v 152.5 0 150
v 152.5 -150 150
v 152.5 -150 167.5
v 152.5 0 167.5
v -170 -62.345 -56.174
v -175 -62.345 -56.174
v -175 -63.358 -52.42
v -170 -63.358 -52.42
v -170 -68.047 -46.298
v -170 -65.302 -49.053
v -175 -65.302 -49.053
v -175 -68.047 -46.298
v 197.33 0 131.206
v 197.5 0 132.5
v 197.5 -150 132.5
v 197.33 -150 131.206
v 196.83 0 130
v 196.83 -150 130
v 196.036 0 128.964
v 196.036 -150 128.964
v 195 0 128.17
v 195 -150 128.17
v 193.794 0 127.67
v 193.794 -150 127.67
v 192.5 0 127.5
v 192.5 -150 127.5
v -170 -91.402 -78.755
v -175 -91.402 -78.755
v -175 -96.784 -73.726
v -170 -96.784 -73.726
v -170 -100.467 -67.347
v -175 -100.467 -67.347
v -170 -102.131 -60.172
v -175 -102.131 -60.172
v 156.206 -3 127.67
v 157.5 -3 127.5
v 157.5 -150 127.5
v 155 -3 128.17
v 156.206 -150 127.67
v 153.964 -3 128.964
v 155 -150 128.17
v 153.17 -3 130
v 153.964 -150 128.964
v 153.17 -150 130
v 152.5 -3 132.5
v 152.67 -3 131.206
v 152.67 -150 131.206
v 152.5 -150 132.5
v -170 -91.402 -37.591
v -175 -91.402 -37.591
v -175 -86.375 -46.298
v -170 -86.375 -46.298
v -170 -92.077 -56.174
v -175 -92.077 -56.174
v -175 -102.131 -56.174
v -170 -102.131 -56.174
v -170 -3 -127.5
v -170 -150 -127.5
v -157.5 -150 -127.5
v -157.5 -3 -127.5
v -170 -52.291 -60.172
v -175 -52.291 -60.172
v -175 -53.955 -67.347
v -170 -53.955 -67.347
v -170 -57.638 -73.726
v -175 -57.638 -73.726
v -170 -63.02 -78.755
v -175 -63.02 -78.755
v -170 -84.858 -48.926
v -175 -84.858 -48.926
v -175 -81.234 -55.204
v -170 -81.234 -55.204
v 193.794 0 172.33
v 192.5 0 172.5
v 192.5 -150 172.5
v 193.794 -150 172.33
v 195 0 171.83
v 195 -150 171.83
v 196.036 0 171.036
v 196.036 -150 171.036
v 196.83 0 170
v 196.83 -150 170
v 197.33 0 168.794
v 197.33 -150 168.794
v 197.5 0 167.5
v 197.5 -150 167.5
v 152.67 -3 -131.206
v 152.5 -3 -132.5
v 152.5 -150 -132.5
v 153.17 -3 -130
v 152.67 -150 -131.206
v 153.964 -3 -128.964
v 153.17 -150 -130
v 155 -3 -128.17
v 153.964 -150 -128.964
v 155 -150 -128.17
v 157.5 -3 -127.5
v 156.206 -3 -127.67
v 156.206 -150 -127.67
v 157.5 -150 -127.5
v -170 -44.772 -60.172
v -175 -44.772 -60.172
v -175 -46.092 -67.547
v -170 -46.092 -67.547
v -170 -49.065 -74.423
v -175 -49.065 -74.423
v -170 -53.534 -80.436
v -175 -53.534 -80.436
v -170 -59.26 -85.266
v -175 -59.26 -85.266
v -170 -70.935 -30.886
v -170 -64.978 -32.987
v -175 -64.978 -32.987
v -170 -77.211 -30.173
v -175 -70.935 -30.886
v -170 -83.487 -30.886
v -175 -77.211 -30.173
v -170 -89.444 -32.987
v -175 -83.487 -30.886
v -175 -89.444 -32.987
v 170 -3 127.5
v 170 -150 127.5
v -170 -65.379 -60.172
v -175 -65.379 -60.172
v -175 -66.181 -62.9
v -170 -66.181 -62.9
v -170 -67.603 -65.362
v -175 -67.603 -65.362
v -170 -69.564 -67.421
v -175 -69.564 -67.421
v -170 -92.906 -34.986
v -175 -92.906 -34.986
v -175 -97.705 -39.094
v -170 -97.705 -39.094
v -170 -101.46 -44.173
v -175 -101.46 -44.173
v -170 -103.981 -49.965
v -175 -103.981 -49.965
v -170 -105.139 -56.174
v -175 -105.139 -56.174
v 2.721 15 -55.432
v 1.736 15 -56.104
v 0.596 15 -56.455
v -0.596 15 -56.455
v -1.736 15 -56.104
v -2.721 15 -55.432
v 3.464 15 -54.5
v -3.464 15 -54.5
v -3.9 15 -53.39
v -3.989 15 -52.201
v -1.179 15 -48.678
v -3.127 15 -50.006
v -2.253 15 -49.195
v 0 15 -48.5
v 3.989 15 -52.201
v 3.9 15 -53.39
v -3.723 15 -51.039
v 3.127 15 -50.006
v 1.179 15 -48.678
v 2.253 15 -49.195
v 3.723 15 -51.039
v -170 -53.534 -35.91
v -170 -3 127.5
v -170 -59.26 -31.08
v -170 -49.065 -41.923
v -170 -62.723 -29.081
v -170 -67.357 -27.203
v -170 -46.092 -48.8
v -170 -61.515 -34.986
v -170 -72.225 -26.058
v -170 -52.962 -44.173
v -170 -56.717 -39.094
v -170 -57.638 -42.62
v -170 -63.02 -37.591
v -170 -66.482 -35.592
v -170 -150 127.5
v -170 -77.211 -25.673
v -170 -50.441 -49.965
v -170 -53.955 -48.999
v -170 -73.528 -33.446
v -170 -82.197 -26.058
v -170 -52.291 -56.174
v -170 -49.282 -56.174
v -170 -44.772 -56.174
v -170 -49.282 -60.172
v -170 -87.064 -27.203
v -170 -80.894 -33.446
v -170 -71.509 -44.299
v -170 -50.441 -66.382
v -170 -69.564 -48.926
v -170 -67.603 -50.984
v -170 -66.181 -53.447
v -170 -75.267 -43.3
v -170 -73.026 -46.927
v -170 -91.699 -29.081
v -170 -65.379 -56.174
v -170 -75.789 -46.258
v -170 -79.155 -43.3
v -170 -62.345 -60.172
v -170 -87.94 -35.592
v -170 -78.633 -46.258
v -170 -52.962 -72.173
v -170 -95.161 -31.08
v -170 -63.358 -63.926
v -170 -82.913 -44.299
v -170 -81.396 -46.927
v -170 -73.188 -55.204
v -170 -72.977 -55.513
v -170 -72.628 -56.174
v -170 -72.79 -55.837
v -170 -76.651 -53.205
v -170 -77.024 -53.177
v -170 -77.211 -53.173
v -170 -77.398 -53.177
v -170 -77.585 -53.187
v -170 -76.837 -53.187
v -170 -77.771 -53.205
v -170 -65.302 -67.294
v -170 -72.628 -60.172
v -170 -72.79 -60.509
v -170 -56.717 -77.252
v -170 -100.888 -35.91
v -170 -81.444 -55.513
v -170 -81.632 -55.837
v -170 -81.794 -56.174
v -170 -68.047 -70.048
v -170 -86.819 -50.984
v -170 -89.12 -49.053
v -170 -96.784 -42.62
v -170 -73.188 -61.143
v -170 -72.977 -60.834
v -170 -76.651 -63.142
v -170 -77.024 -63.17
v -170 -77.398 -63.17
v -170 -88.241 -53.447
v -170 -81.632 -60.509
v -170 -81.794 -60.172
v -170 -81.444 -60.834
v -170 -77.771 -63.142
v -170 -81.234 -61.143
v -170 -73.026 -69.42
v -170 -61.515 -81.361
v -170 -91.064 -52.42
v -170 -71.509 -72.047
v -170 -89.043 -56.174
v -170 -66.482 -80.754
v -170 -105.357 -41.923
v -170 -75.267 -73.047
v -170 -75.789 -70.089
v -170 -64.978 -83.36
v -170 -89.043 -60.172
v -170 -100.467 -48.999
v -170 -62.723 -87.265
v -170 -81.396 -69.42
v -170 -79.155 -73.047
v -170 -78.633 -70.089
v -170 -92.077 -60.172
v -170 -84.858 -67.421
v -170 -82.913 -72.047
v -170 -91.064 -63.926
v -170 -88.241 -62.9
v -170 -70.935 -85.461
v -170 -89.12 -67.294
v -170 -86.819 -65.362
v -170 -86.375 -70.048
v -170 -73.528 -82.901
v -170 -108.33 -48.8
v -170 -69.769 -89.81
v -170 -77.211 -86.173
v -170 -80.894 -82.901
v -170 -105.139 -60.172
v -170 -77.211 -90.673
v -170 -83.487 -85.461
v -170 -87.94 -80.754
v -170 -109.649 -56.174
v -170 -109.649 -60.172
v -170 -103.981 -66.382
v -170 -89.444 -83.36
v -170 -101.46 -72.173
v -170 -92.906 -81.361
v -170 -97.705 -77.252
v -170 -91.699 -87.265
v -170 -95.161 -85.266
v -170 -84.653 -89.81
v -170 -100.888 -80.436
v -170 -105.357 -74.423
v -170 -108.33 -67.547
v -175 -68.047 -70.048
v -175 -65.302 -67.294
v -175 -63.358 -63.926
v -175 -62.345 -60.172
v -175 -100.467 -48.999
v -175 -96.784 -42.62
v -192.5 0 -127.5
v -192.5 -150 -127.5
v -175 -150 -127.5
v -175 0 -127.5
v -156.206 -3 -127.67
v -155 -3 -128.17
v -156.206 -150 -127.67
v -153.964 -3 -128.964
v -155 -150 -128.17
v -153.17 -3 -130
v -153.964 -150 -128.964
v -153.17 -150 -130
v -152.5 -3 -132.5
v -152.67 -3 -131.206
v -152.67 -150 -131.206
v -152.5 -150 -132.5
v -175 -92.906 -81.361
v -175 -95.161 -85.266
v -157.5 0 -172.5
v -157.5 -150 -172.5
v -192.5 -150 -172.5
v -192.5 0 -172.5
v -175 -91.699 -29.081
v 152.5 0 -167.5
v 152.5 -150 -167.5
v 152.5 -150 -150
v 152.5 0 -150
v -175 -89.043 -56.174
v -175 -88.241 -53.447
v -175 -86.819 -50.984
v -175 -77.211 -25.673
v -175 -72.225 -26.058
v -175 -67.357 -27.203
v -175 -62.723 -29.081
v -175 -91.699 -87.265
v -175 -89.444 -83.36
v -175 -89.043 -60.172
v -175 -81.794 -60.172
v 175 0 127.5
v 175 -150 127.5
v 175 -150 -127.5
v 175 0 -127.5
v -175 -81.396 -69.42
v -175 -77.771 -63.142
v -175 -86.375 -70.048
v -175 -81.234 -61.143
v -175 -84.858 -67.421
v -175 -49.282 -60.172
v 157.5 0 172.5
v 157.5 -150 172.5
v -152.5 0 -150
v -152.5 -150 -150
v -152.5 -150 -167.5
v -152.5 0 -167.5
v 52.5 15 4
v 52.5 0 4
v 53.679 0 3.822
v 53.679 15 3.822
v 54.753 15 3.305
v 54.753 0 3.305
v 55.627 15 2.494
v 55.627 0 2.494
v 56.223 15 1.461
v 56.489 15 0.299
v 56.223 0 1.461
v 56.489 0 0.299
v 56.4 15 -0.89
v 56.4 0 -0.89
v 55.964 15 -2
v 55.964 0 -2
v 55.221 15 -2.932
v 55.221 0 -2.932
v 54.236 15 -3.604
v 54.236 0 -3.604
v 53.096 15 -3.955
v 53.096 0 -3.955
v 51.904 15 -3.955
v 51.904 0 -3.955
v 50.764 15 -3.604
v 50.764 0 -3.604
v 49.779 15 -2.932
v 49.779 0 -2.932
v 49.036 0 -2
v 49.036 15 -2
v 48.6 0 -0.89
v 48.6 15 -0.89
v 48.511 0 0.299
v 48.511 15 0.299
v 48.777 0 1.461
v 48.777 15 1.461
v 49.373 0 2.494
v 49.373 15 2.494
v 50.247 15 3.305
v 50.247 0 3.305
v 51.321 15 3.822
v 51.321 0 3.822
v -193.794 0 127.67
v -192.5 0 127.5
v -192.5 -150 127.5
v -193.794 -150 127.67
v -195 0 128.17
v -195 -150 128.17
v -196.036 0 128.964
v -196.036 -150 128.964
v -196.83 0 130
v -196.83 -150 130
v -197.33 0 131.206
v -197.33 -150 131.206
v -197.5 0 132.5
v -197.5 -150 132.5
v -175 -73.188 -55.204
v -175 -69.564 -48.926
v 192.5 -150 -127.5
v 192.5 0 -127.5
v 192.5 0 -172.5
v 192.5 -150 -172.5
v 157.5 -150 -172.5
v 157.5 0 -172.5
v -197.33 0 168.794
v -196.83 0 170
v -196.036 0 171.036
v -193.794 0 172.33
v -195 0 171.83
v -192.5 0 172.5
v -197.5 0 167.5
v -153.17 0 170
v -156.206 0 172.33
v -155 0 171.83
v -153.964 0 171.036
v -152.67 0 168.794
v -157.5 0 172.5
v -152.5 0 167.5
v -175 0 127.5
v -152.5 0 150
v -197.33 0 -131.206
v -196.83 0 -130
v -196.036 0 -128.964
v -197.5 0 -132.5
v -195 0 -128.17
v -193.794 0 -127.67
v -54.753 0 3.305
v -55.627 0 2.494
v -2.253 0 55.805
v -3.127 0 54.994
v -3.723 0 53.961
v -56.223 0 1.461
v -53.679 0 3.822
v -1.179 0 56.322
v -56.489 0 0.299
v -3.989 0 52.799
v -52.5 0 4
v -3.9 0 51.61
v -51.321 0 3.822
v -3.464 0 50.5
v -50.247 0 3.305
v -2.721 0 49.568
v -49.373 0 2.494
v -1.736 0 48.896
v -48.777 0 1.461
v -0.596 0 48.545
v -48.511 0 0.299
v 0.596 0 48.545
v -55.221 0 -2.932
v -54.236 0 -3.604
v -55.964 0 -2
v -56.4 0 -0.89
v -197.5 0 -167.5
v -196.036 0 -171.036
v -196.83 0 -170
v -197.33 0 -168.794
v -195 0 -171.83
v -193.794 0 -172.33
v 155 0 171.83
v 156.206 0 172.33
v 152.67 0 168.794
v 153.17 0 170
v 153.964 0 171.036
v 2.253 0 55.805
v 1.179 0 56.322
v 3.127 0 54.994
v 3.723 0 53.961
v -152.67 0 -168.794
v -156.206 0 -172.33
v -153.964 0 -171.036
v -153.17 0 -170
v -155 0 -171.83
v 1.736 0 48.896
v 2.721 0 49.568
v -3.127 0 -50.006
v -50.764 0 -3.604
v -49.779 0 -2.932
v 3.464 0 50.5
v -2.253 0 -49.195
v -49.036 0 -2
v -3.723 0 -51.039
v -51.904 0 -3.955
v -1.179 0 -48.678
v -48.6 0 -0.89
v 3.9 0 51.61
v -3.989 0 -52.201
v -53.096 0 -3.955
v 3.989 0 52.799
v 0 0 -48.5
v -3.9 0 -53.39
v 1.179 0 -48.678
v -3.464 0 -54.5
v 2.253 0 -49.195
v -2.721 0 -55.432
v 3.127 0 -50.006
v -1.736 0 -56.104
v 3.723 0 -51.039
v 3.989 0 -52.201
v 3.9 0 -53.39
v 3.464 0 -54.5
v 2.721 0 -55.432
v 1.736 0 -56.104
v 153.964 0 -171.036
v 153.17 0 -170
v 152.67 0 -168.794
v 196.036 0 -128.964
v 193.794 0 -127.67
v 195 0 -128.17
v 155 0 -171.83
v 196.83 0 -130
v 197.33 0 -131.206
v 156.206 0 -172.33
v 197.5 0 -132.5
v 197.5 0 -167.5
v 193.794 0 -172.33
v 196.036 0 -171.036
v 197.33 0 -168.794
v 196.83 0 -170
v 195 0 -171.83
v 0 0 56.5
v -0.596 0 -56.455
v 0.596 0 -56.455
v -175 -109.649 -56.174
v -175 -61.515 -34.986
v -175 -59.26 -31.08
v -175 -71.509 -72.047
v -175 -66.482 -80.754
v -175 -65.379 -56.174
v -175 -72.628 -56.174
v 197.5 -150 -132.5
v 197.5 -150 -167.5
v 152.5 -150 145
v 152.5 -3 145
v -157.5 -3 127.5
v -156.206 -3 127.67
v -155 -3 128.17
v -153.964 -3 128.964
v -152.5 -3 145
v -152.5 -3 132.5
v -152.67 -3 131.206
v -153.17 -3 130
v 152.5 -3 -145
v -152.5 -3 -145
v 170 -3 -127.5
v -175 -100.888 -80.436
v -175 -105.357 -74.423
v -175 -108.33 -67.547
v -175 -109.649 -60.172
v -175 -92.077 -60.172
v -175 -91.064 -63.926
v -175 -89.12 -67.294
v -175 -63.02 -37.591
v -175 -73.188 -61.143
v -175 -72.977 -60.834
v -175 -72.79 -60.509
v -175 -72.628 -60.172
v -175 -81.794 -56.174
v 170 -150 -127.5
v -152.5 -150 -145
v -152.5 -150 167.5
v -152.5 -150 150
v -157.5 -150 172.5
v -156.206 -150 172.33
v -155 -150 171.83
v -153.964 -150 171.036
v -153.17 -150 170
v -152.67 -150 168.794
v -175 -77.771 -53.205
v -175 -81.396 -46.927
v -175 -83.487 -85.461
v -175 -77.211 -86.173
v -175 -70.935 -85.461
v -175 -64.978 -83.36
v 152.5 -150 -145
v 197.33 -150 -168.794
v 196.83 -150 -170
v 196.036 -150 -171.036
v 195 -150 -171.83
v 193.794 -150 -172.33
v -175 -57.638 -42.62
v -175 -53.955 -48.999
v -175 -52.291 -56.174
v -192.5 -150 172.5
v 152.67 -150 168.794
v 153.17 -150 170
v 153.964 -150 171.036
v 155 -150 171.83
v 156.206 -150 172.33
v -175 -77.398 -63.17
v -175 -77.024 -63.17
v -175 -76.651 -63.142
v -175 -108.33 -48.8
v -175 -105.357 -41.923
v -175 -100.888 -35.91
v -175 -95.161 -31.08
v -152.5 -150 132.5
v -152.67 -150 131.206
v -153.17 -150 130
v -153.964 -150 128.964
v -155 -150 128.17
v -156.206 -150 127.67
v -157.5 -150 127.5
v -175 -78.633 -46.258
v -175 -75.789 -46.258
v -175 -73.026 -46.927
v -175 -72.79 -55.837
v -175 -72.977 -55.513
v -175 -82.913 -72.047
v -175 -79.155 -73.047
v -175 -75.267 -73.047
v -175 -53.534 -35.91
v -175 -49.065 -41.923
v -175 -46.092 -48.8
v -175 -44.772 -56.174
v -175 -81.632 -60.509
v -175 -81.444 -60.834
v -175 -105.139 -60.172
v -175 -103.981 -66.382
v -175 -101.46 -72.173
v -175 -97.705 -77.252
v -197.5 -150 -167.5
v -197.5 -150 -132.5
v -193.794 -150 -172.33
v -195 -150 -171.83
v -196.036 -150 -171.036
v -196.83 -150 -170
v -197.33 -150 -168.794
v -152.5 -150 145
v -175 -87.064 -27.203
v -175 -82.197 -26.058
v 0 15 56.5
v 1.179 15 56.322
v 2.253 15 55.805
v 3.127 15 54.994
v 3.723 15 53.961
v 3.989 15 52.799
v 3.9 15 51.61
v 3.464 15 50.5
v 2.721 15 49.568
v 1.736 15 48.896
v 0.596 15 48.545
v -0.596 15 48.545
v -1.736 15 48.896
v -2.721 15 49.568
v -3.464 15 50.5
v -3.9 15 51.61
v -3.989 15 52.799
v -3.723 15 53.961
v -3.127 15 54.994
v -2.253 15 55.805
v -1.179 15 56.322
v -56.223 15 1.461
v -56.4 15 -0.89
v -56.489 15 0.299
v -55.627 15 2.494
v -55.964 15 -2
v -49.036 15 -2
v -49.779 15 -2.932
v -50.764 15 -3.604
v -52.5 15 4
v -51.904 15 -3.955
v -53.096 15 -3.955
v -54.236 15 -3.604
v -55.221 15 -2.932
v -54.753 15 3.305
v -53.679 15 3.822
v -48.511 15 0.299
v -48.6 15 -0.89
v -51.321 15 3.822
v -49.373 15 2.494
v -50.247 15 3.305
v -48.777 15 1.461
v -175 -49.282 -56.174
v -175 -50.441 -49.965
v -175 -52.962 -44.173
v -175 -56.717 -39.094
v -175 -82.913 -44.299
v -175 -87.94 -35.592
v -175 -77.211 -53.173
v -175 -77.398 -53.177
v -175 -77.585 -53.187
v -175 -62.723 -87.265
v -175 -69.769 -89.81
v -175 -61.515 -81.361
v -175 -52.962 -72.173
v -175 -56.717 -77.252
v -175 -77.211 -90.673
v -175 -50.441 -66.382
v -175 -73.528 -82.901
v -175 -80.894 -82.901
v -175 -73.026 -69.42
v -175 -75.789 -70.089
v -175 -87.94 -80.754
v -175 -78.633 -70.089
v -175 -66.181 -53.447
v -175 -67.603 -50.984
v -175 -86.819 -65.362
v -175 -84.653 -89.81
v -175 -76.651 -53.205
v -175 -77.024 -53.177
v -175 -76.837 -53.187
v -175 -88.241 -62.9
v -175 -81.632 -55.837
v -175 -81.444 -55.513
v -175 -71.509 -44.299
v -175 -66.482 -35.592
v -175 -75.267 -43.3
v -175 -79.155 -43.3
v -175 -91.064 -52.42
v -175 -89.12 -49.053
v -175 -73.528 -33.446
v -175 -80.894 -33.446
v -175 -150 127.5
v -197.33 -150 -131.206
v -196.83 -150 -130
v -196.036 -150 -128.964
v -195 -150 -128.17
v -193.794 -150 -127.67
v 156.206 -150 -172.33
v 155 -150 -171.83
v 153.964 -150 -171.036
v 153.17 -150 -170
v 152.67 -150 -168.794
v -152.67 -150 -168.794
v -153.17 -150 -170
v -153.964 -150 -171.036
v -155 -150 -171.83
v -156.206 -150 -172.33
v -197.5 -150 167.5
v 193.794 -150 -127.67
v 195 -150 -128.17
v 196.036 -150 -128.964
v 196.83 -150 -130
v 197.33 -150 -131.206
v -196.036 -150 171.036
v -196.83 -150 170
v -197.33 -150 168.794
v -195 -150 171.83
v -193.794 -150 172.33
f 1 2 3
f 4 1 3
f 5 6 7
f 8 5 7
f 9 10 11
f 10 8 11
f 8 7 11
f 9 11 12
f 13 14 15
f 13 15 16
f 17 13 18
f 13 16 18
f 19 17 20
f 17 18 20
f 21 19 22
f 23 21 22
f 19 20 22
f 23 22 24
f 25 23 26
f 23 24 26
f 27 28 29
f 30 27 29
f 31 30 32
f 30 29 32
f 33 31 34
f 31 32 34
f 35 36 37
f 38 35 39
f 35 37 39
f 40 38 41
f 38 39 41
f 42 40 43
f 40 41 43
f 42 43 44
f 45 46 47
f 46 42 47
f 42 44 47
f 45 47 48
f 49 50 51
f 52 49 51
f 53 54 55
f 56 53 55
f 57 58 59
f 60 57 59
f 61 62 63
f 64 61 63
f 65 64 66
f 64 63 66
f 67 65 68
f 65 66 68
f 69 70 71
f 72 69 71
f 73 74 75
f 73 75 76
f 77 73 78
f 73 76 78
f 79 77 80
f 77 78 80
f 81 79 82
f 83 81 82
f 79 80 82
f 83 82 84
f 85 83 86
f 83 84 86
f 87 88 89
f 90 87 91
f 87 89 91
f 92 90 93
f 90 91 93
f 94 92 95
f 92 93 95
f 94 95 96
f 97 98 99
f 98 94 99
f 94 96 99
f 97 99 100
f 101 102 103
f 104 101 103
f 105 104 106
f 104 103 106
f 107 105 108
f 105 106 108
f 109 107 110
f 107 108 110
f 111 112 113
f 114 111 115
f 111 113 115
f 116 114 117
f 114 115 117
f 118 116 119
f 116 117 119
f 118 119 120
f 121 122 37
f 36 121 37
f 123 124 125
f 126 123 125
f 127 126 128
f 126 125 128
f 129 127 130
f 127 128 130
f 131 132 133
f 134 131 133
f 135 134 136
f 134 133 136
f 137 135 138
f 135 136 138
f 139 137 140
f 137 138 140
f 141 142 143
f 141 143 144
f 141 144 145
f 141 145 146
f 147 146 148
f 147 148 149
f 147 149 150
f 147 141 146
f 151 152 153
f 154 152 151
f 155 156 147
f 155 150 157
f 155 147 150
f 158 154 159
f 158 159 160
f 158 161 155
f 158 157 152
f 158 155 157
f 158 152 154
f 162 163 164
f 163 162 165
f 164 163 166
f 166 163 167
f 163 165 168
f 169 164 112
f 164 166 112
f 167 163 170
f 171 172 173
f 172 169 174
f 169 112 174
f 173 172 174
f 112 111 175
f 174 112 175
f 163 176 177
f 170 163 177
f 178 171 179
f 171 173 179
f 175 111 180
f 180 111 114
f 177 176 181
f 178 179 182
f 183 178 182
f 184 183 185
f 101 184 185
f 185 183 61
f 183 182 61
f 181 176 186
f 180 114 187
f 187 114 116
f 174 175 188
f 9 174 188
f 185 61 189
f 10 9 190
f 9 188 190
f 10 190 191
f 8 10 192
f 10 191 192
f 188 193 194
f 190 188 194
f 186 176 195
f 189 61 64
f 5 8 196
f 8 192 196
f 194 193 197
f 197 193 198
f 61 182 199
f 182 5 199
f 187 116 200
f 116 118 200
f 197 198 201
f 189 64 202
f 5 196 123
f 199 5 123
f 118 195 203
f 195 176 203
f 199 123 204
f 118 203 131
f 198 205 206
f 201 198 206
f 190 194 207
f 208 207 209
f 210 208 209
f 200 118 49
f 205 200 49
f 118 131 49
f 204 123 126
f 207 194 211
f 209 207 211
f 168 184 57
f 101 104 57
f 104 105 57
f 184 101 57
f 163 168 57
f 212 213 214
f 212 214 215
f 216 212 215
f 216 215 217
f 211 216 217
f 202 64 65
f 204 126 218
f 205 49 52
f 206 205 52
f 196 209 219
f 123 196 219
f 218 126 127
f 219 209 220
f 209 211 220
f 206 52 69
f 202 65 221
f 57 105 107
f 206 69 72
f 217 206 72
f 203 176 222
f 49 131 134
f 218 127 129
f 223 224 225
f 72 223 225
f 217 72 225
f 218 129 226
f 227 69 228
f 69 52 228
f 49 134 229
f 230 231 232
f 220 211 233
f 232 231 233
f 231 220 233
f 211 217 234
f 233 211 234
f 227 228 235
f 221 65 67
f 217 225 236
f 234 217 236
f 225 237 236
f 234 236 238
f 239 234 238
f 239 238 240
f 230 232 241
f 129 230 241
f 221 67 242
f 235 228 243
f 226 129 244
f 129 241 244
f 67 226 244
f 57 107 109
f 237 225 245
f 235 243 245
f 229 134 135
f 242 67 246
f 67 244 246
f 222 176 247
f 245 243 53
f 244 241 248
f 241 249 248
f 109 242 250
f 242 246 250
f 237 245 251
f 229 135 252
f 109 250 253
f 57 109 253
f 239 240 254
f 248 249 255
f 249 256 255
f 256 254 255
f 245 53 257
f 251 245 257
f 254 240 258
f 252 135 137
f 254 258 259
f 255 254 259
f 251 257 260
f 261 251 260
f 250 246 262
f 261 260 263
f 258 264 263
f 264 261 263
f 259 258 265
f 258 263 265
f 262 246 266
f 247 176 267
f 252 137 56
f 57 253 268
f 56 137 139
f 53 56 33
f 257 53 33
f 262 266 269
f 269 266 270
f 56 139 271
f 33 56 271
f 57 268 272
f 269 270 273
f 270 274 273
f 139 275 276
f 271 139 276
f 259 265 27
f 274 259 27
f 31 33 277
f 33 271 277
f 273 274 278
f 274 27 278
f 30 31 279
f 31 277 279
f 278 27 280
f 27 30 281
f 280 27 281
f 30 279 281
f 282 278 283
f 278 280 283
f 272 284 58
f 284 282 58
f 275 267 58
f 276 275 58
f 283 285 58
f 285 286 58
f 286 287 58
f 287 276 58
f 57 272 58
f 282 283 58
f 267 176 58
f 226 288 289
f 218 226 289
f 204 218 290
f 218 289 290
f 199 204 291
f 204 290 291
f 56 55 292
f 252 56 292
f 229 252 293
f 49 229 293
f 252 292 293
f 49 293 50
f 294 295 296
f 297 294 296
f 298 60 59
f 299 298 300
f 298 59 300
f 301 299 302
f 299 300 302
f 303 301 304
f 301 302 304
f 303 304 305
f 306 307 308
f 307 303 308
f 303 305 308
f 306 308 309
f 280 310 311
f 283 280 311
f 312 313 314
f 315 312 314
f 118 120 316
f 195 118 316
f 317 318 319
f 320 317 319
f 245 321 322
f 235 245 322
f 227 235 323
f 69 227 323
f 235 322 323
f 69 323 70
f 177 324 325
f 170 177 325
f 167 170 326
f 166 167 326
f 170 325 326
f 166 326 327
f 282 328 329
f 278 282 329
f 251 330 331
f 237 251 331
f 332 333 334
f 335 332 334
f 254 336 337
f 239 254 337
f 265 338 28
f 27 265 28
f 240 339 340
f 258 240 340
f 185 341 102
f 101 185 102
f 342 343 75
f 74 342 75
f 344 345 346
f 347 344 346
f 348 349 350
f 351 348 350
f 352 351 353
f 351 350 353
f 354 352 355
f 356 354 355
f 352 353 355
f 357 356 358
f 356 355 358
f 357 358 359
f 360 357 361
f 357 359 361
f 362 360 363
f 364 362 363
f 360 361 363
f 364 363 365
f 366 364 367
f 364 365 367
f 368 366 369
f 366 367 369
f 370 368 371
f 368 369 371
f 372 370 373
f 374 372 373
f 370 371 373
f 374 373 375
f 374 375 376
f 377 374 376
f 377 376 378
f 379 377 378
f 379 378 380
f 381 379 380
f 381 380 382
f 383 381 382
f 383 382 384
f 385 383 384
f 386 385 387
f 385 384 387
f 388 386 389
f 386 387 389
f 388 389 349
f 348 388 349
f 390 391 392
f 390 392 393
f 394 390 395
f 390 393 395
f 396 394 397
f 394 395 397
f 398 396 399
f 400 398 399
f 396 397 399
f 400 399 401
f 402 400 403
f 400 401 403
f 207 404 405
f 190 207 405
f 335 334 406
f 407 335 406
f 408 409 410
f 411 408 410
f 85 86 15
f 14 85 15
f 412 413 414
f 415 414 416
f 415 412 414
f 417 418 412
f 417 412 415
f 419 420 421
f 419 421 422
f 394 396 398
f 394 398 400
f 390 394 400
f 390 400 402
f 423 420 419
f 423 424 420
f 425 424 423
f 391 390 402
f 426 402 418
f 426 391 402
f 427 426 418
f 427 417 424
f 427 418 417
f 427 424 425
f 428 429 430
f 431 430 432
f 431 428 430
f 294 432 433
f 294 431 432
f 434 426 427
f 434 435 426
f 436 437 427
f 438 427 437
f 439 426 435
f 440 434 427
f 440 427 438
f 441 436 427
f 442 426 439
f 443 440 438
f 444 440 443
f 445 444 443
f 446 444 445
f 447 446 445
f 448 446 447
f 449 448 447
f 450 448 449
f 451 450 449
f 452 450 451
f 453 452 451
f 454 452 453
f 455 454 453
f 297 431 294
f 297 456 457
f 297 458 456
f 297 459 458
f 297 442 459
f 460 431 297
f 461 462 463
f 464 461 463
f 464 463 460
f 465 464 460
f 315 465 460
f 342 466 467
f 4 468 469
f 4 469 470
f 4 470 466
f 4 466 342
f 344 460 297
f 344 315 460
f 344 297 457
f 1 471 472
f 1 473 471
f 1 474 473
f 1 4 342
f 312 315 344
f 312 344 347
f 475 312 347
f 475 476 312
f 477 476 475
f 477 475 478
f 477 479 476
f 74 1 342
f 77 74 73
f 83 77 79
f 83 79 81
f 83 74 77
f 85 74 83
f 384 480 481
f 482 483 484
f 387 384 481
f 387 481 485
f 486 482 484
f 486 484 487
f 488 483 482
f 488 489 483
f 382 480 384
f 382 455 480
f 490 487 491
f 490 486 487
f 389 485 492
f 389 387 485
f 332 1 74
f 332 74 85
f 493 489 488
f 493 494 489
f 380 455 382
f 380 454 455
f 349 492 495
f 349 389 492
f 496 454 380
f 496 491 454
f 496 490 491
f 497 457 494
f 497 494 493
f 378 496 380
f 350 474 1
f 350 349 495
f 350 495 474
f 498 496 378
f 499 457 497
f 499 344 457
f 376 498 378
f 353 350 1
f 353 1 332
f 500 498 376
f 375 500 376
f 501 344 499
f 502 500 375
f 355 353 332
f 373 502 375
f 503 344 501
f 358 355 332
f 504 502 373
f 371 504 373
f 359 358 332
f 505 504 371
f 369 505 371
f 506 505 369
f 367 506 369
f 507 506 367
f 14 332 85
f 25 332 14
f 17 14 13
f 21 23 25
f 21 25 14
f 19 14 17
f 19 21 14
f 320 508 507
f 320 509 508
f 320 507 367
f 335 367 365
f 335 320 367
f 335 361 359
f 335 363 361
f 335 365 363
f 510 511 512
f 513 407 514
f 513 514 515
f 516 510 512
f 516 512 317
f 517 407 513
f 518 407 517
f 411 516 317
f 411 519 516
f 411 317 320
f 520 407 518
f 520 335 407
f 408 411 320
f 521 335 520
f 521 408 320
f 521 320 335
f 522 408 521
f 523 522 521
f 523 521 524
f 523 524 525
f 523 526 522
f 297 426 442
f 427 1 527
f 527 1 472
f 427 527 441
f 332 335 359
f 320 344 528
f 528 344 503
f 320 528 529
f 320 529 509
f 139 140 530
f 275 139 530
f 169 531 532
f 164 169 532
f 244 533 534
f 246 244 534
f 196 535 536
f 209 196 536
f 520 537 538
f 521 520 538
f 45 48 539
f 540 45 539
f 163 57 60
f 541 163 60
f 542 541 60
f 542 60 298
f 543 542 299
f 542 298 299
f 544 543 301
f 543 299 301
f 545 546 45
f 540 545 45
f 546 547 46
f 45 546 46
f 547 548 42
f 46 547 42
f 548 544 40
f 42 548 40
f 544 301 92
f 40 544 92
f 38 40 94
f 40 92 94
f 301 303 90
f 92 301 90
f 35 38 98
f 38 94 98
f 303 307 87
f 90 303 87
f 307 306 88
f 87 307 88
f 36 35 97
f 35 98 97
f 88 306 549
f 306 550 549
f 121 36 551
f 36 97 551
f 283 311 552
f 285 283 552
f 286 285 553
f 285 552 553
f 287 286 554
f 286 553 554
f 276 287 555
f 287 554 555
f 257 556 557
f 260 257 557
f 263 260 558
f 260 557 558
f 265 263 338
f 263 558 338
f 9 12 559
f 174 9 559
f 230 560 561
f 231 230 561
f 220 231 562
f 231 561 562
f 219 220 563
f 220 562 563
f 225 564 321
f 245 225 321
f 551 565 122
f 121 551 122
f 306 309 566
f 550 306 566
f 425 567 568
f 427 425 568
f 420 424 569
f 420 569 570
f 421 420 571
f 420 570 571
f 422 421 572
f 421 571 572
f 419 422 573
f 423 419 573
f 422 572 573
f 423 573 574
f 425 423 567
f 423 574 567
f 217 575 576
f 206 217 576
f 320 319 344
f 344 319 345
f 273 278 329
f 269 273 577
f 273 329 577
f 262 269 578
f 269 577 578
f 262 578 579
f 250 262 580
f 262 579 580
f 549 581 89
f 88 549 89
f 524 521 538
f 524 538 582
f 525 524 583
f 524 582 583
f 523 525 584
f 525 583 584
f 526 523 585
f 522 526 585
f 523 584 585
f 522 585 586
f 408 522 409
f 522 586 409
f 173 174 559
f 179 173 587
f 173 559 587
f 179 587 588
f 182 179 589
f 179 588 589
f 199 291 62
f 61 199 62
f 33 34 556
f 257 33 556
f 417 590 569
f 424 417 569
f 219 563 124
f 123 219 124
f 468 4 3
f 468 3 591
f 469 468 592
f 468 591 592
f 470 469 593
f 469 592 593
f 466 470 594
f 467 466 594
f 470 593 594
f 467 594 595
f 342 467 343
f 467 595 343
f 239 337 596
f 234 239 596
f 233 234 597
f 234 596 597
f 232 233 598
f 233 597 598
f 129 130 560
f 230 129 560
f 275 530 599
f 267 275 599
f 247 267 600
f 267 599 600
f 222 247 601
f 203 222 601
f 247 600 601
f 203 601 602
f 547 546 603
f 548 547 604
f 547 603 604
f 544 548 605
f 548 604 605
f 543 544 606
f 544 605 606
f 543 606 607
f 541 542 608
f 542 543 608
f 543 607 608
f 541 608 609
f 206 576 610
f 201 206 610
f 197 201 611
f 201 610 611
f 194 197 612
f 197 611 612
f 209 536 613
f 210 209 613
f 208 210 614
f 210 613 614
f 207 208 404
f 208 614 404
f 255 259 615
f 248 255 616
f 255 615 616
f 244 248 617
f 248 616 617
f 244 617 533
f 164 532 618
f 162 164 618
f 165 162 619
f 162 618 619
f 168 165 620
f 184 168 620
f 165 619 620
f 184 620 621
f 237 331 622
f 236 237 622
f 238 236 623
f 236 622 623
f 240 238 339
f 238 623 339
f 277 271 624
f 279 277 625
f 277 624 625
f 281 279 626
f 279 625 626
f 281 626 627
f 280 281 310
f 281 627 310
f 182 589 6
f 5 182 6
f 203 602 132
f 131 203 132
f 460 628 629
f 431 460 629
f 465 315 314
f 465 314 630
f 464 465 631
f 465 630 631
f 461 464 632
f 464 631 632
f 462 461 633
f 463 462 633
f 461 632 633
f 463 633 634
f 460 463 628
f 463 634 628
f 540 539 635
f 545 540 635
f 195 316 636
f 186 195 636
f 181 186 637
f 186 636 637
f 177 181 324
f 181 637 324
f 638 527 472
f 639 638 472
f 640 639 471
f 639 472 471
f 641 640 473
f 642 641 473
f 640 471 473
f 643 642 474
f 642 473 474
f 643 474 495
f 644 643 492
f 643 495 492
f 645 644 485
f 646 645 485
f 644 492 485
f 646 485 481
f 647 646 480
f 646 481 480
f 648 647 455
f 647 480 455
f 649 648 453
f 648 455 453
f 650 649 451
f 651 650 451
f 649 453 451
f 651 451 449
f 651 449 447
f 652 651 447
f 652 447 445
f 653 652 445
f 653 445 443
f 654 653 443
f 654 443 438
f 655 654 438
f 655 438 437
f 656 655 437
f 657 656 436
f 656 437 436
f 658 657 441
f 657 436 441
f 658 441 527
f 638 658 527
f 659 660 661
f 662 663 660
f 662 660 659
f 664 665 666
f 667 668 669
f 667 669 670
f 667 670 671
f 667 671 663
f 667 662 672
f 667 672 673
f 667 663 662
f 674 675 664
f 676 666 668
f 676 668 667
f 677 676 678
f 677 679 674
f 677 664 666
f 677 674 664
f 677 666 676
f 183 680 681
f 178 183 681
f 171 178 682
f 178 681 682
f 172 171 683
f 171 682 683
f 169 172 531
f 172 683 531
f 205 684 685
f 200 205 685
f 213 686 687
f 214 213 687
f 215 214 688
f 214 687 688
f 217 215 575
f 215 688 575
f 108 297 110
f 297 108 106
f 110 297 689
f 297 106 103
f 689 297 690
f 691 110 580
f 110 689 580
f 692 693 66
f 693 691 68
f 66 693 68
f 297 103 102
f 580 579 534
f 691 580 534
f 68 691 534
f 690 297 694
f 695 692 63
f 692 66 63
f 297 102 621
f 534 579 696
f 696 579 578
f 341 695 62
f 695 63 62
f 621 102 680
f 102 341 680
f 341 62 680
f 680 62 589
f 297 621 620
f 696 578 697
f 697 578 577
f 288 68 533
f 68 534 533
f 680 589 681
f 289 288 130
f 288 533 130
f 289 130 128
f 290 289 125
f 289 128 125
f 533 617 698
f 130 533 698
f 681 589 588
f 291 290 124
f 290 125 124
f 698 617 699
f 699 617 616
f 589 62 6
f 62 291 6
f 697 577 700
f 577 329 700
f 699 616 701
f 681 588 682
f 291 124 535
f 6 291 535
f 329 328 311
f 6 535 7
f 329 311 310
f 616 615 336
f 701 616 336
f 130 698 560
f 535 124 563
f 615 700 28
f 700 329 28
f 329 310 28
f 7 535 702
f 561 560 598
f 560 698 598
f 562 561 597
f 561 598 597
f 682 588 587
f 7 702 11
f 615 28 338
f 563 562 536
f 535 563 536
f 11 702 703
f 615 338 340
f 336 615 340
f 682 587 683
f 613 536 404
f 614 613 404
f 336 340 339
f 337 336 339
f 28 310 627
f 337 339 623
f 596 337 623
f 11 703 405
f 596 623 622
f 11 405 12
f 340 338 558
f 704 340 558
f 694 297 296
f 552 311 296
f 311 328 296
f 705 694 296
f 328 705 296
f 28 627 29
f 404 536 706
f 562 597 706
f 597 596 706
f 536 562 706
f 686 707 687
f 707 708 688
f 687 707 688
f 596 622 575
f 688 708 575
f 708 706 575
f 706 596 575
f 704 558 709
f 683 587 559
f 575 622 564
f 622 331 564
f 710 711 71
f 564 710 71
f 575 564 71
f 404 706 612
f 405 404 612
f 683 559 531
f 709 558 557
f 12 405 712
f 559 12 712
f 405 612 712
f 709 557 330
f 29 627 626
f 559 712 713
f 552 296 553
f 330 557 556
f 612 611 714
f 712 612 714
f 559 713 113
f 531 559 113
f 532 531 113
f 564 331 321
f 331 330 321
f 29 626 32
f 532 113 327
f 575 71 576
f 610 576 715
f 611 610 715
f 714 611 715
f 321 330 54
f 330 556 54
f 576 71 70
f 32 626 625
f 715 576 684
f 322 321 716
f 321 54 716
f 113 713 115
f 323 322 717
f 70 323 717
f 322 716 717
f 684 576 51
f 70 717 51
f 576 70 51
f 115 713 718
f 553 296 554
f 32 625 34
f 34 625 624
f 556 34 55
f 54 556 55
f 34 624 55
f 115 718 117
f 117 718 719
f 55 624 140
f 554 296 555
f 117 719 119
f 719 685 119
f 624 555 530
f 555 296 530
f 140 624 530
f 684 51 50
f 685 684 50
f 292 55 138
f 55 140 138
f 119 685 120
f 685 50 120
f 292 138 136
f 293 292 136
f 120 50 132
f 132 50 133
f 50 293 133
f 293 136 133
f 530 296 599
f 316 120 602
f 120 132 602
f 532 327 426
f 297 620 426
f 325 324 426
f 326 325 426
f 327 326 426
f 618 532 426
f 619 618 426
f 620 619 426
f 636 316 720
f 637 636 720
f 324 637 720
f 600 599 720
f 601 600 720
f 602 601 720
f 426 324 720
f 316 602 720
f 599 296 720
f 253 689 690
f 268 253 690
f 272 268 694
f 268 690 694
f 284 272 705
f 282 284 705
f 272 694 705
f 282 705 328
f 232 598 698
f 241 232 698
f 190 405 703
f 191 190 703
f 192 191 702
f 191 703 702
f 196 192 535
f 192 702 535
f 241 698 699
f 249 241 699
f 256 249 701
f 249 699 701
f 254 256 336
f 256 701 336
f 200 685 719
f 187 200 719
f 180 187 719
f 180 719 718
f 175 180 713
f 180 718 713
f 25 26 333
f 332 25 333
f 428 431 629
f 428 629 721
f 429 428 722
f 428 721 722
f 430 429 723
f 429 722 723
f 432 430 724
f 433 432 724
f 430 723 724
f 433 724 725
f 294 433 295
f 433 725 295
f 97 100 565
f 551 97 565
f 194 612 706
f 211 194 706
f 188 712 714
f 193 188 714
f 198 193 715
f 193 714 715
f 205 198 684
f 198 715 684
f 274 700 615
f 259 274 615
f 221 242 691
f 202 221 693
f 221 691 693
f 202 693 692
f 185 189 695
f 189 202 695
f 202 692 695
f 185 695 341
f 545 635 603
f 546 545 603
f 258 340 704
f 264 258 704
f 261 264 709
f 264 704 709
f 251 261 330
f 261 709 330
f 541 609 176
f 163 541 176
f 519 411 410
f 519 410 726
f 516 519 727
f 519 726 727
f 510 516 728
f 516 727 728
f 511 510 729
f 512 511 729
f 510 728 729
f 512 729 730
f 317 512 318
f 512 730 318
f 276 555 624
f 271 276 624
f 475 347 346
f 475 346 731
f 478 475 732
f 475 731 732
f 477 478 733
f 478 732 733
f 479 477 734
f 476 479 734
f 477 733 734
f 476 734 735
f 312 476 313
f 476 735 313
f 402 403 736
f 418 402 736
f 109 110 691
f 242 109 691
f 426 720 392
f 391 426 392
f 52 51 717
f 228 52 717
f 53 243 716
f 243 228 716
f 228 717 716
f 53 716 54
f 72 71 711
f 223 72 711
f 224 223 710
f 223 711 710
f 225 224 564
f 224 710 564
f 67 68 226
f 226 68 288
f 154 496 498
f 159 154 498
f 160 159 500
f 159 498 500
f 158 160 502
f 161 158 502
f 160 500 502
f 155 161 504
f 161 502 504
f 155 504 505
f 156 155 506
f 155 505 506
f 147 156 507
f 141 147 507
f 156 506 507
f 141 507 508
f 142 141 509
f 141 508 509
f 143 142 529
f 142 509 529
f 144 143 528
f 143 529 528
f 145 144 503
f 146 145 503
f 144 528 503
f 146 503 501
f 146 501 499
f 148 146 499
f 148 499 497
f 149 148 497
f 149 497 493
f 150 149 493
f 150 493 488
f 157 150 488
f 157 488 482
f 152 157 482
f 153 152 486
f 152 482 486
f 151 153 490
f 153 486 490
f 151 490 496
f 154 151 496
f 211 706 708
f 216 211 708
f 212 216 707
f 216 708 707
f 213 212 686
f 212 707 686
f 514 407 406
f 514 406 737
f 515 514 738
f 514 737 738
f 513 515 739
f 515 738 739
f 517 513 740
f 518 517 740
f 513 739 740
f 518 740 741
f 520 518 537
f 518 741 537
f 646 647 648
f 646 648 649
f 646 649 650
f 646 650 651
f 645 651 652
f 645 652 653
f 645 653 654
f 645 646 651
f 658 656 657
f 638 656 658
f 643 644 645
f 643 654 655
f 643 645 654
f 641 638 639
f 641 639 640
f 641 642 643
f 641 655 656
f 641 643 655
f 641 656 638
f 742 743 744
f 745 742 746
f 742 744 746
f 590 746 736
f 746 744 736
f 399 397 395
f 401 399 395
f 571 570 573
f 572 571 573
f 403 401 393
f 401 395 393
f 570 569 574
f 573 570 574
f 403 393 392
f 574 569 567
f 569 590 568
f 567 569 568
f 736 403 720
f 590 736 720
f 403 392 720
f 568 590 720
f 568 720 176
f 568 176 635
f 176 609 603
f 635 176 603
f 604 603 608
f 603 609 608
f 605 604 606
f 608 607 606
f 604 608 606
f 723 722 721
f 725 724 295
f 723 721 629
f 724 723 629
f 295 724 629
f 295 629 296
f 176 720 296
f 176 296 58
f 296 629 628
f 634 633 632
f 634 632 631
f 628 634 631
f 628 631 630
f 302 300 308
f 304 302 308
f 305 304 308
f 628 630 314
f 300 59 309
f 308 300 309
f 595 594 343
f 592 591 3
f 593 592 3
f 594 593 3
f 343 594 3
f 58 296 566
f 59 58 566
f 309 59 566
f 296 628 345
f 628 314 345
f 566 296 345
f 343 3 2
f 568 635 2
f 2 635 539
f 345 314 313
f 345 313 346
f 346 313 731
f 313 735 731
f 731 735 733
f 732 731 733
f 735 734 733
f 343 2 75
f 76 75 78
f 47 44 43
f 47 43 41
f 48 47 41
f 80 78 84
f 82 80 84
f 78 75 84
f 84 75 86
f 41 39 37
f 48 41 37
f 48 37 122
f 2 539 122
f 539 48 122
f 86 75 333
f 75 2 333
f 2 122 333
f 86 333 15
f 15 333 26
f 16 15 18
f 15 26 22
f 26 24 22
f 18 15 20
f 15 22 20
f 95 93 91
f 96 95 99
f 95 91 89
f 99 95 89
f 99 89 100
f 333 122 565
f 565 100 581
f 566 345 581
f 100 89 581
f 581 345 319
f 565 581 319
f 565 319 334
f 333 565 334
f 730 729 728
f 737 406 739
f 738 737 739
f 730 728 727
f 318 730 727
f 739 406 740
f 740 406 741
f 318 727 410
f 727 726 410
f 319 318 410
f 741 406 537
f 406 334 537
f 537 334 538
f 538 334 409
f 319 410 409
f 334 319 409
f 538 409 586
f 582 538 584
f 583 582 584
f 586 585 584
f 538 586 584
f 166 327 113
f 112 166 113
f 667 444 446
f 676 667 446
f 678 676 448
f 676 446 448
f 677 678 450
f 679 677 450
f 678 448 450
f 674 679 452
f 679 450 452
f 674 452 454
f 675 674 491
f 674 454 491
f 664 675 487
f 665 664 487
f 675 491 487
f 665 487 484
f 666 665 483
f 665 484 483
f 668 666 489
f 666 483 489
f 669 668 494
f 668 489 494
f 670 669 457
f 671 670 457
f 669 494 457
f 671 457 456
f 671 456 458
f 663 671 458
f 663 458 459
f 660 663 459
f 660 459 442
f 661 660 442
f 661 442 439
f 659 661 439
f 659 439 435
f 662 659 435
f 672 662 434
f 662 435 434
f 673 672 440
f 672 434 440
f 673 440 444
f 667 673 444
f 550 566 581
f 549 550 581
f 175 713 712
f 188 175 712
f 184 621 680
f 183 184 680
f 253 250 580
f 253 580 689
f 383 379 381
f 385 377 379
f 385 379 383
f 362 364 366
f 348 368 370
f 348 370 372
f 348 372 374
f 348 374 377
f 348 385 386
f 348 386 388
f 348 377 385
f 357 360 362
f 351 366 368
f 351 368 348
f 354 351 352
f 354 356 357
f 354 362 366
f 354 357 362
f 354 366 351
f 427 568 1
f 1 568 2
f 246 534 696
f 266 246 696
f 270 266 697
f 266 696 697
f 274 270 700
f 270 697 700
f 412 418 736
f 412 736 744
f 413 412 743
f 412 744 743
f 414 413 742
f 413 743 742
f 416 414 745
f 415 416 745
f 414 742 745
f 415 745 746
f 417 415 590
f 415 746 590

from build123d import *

# Parameters (mm, degrees)
SKETCH1_W           = 350
SKETCH1_H           = 300
BOSS_EXTRUDE1_DEPTH = 3
SKETCH1_3_R         = 4
BOSS_EXTRUDE2_DEPTH = 15
BOSS_EXTRUDE3_DEPTH = 150
CUT_EXTRUDE1_DEPTH  = 150


with BuildPart() as part:
    # Sketch1 → Boss-Extrude1 (new body)
    with BuildSketch(Plane(origin=(0, 0, 0), x_dir=(1, 0, 0), z_dir=(0, 1, 0))):
        Rectangle(SKETCH1_W, SKETCH1_H)
    extrude(amount=-BOSS_EXTRUDE1_DEPTH)

    # Sketch1<3> → Boss-Extrude2 (add)
    with BuildSketch(Plane(origin=(0, 0, 0), x_dir=(1, 0, 0), z_dir=(0, 1, 0))):
        with Locations((0, 52.5)):
            Circle(SKETCH1_3_R)
        with Locations((0, -52.5)):
            Circle(SKETCH1_3_R)
        with Locations((52.5, 0)):
            Circle(SKETCH1_3_R)
        with Locations((-52.5, 0)):
            Circle(SKETCH1_3_R)
    extrude(amount=BOSS_EXTRUDE2_DEPTH)

    # Sketch1<4> → Boss-Extrude3 (add)
    with BuildSketch(Plane(origin=(0, 0, 0), x_dir=(1, 0, 0), z_dir=(0, 1, 0))):
        with BuildLine():
            Line((-192.5, 127.5), (-175, 127.5))
            Line((-175, 127.5), (-175, -127.5))
            Line((-175, -127.5), (-192.5, -127.5))
            ThreePointArc((-192.5, -127.5), (-196.035533906, -128.964466094), (-197.5, -132.5))
            Line((-197.5, -132.5), (-197.5, -167.5))
            ThreePointArc((-197.5, -167.5), (-196.035533906, -171.035533906), (-192.5, -172.5))
            Line((-192.5, -172.5), (-157.5, -172.5))
            ThreePointArc((-157.5, -172.5), (-153.964466094, -171.035533906), (-152.5, -167.5))
            Line((-152.5, -167.5), (-152.5, -150))
            Line((-152.5, -150), (152.5, -150))
            Line((152.5, -150), (152.5, -167.5))
            ThreePointArc((152.5, -167.5), (153.964466094, -171.035533906), (157.5, -172.5))
            Line((157.5, -172.5), (192.5, -172.5))
            ThreePointArc((192.5, -172.5), (196.035533906, -171.035533906), (197.5, -167.5))
            Line((197.5, -167.5), (197.5, -132.5))
            ThreePointArc((197.5, -132.5), (196.035533906, -128.964466094), (192.5, -127.5))
            Line((192.5, -127.5), (175, -127.5))
            Line((175, -127.5), (175, 127.5))
            Line((175, 127.5), (192.5, 127.5))
            ThreePointArc((192.5, 127.5), (196.035533906, 128.964466094), (197.5, 132.5))
            Line((197.5, 132.5), (197.5, 167.5))
            ThreePointArc((197.5, 167.5), (196.035533906, 171.035533906), (192.5, 172.5))
            Line((192.5, 172.5), (157.5, 172.5))
            ThreePointArc((157.5, 172.5), (153.964466094, 171.035533906), (152.5, 167.5))
            Line((152.5, 167.5), (152.5, 150))
            Line((152.5, 150), (-152.5, 150))
            Line((-152.5, 150), (-152.5, 167.5))
            ThreePointArc((-152.5, 167.5), (-153.964466094, 171.035533906), (-157.5, 172.5))
            Line((-157.5, 172.5), (-192.5, 172.5))
            ThreePointArc((-192.5, 172.5), (-196.035533906, 171.035533906), (-197.5, 167.5))
            Line((-197.5, 167.5), (-197.5, 132.5))
            ThreePointArc((-197.5, 132.5), (-196.035533906, 128.964466094), (-192.5, 127.5))
        make_face()
        with BuildLine():
            Line((-170, -127.5), (-170, 127.5))
            Line((-170, 127.5), (-157.5, 127.5))
            ThreePointArc((-157.5, 127.5), (-153.964466094, 128.964466094), (-152.5, 132.5))
            Line((-152.5, 132.5), (-152.5, 145))
            Line((-152.5, 145), (152.5, 145))
            Line((152.5, 145), (152.5, 132.5))
            ThreePointArc((152.5, 132.5), (153.964466094, 128.964466094), (157.5, 127.5))
            Line((157.5, 127.5), (170, 127.5))
            Line((170, 127.5), (170, -127.5))
            Line((170, -127.5), (157.5, -127.5))
            ThreePointArc((157.5, -127.5), (153.964466094, -128.964466094), (152.5, -132.5))
            Line((152.5, -132.5), (152.5, -145))
            Line((152.5, -145), (-152.5, -145))
            Line((-152.5, -145), (-152.5, -132.5))
            ThreePointArc((-152.5, -132.5), (-153.964466094, -128.964466094), (-157.5, -127.5))
            Line((-157.5, -127.5), (-170, -127.5))
        make_face(mode=Mode.SUBTRACT)
    extrude(amount=-BOSS_EXTRUDE3_DEPTH)

    # Sketch3 → Cut-Extrude1 (cut)
    with BuildSketch(Plane.ZY.offset(175)):
        with BuildLine():
            ThreePointArc((-60.172318038, -44.772481883), (-74.423265007, -49.065117798), (-85.266270244, -59.260481944))
            Line((-85.266270244, -59.260481944), (-81.360570452, -61.515438771))
            ThreePointArc((-81.360570452, -61.515438771), (-72.173265007, -52.962232115), (-60.172318038, -49.282395536))
            Line((-60.172318038, -49.282395536), (-60.172318038, -44.772481883))
        make_face()
        with BuildLine():
            Line((-83.359623482, -64.977900186), (-87.265323275, -62.72294336))
            ThreePointArc((-87.265323275, -62.72294336), (-90.673265007, -77.210943421), (-87.265323275, -91.698943483))
            Line((-87.265323275, -91.698943483), (-83.359623482, -89.443986656))
            ThreePointArc((-83.359623482, -89.443986656), (-86.173265007, -77.210943421), (-83.359623482, -64.977900186))
        make_face()
        with BuildLine():
            ThreePointArc((-60.172318038, -52.290995849), (-70.673265007, -55.560308327), (-78.75504615, -63.019738928))
            Line((-78.75504615, -63.019738928), (-70.048241987, -68.046614655))
            ThreePointArc((-70.048241987, -68.046614655), (-65.673265007, -64.220562364), (-60.172318038, -62.344747304))
            Line((-60.172318038, -62.344747304), (-60.172318038, -52.290995849))
        make_face()
        with BuildLine():
            ThreePointArc((-31.080259771, -59.260481944), (-41.923265007, -49.065117798), (-56.174211977, -44.772481883))
            Line((-56.174211977, -44.772481883), (-56.174211977, -49.282395536))
            ThreePointArc((-56.174211977, -49.282395536), (-44.173265007, -52.962232115), (-34.985959563, -61.515438771))
            Line((-34.985959563, -61.515438771), (-31.080259771, -59.260481944))
        make_face()
        with BuildLine():
            Line((-72.047295017, -71.50907607), (-80.754099181, -66.482200343))
            ThreePointArc((-80.754099181, -66.482200343), (-83.173265007, -77.210943421), (-80.754099181, -87.939686499))
            Line((-80.754099181, -87.939686499), (-72.047295017, -82.912810772))
            ThreePointArc((-72.047295017, -82.912810772), (-73.173265007, -77.210943421), (-72.047295017, -71.50907607))
        make_face()
        with BuildLine():
            Line((-81.360570452, -92.906448072), (-85.266270244, -95.161404898))
            ThreePointArc((-85.266270244, -95.161404898), (-74.423265007, -105.356769044), (-60.172318038, -109.64940496))
            Line((-60.172318038, -109.64940496), (-60.172318038, -105.139491306))
            ThreePointArc((-60.172318038, -105.139491306), (-72.173265007, -101.459654727), (-81.360570452, -92.906448072))
        make_face()
        with BuildLine():
            ThreePointArc((-60.172318038, -65.378623827), (-64.173265007, -66.818638576), (-67.420827847, -69.563552916))
            Line((-67.420827847, -69.563552916), (-61.142723279, -73.188218278))
            ThreePointArc((-61.142723279, -73.188218278), (-60.673265007, -72.880816402), (-60.172318038, -72.627954551))
            Line((-60.172318038, -72.627954551), (-60.172318038, -65.378623827))
        make_face()
        with BuildLine():
            ThreePointArc((-37.591483864, -63.019738928), (-45.673265007, -55.560308327), (-56.174211977, -52.290995849))
            Line((-56.174211977, -52.290995849), (-56.174211977, -62.344747304))
            ThreePointArc((-56.174211977, -62.344747304), (-50.673265007, -64.220562364), (-46.298288028, -68.046614655))
            Line((-46.298288028, -68.046614655), (-37.591483864, -63.019738928))
        make_face()
        with BuildLine():
            ThreePointArc((-29.08120674, -91.698943483), (-25.673265007, -77.210943421), (-29.08120674, -62.72294336))
            Line((-29.08120674, -62.72294336), (-32.986906533, -64.977900186))
            ThreePointArc((-32.986906533, -64.977900186), (-30.173265007, -77.210943421), (-32.986906533, -89.443986656))
            Line((-32.986906533, -89.443986656), (-29.08120674, -91.698943483))
        make_face()
        with BuildLine():
            Line((-63.141776309, -76.650679694), (-69.419880877, -73.026014332))
            ThreePointArc((-69.419880877, -73.026014332), (-70.173265007, -77.210943421), (-69.419880877, -81.395872511))
            Line((-69.419880877, -81.395872511), (-63.141776309, -77.771207148))
            ThreePointArc((-63.141776309, -77.771207148), (-63.173265007, -77.210943421), (-63.141776309, -76.650679694))
        make_face()
        with BuildLine():
            Line((-70.048241987, -86.375272187), (-78.75504615, -91.402147915))
            ThreePointArc((-78.75504615, -91.402147915), (-70.673265007, -98.861578516), (-60.172318038, -102.130890993))
            Line((-60.172318038, -102.130890993), (-60.172318038, -92.077139538))
            ThreePointArc((-60.172318038, -92.077139538), (-65.673265007, -90.201324478), (-70.048241987, -86.375272187))
        make_face()
        with BuildLine():
            Line((-56.174211977, -105.139491306), (-56.174211977, -109.64940496))
            ThreePointArc((-56.174211977, -109.64940496), (-41.923265007, -105.356769044), (-31.080259771, -95.161404898))
            Line((-31.080259771, -95.161404898), (-34.985959563, -92.906448072))
            ThreePointArc((-34.985959563, -92.906448072), (-44.173265007, -101.459654727), (-56.174211977, -105.139491306))
        make_face()
        with BuildLine():
            ThreePointArc((-48.925702168, -69.563552916), (-52.173265007, -66.818638576), (-56.174211977, -65.378623827))
            Line((-56.174211977, -65.378623827), (-56.174211977, -72.627954551))
            ThreePointArc((-56.174211977, -72.627954551), (-55.673265007, -72.880816402), (-55.203806736, -73.188218278))
            Line((-55.203806736, -73.188218278), (-48.925702168, -69.563552916))
        make_face()
        with BuildLine():
            ThreePointArc((-35.592430834, -87.939686499), (-33.173265007, -77.210943421), (-35.592430834, -66.482200343))
            Line((-35.592430834, -66.482200343), (-44.299234997, -71.50907607))
            ThreePointArc((-44.299234997, -71.50907607), (-43.173265007, -77.210943421), (-44.299234997, -82.912810772))
            Line((-44.299234997, -82.912810772), (-35.592430834, -87.939686499))
        make_face()
        with BuildLine():
            Line((-61.142723279, -81.233668564), (-67.420827847, -84.858333926))
            ThreePointArc((-67.420827847, -84.858333926), (-64.173265007, -87.603248267), (-60.172318038, -89.043263015))
            Line((-60.172318038, -89.043263015), (-60.172318038, -81.793932291))
            ThreePointArc((-60.172318038, -81.793932291), (-60.673265007, -81.54107044), (-61.142723279, -81.233668564))
        make_face()
        with BuildLine():
            Line((-56.174211977, -92.077139538), (-56.174211977, -102.130890993))
            ThreePointArc((-56.174211977, -102.130890993), (-45.673265007, -98.861578516), (-37.591483864, -91.402147915))
            Line((-37.591483864, -91.402147915), (-46.298288028, -86.375272187))
            ThreePointArc((-46.298288028, -86.375272187), (-50.673265007, -90.201324478), (-56.174211977, -92.077139538))
        make_face()
        with BuildLine():
            ThreePointArc((-46.926649138, -81.395872511), (-46.173265007, -77.210943421), (-46.926649138, -73.026014332))
            Line((-46.926649138, -73.026014332), (-53.204753706, -76.650679694))
            ThreePointArc((-53.204753706, -76.650679694), (-53.173265007, -77.210943421), (-53.204753706, -77.771207148))
            Line((-53.204753706, -77.771207148), (-46.926649138, -81.395872511))
        make_face()
        with BuildLine():
            Line((-56.174211977, -81.793932291), (-56.174211977, -89.043263015))
            ThreePointArc((-56.174211977, -89.043263015), (-52.173265007, -87.603248267), (-48.925702168, -84.858333926))
            Line((-48.925702168, -84.858333926), (-55.203806736, -81.233668564))
            ThreePointArc((-55.203806736, -81.233668564), (-55.673265007, -81.54107044), (-56.174211977, -81.793932291))
        make_face()
    extrude(amount=-CUT_EXTRUDE1_DEPTH, mode=Mode.SUBTRACT)


solid = part.part
